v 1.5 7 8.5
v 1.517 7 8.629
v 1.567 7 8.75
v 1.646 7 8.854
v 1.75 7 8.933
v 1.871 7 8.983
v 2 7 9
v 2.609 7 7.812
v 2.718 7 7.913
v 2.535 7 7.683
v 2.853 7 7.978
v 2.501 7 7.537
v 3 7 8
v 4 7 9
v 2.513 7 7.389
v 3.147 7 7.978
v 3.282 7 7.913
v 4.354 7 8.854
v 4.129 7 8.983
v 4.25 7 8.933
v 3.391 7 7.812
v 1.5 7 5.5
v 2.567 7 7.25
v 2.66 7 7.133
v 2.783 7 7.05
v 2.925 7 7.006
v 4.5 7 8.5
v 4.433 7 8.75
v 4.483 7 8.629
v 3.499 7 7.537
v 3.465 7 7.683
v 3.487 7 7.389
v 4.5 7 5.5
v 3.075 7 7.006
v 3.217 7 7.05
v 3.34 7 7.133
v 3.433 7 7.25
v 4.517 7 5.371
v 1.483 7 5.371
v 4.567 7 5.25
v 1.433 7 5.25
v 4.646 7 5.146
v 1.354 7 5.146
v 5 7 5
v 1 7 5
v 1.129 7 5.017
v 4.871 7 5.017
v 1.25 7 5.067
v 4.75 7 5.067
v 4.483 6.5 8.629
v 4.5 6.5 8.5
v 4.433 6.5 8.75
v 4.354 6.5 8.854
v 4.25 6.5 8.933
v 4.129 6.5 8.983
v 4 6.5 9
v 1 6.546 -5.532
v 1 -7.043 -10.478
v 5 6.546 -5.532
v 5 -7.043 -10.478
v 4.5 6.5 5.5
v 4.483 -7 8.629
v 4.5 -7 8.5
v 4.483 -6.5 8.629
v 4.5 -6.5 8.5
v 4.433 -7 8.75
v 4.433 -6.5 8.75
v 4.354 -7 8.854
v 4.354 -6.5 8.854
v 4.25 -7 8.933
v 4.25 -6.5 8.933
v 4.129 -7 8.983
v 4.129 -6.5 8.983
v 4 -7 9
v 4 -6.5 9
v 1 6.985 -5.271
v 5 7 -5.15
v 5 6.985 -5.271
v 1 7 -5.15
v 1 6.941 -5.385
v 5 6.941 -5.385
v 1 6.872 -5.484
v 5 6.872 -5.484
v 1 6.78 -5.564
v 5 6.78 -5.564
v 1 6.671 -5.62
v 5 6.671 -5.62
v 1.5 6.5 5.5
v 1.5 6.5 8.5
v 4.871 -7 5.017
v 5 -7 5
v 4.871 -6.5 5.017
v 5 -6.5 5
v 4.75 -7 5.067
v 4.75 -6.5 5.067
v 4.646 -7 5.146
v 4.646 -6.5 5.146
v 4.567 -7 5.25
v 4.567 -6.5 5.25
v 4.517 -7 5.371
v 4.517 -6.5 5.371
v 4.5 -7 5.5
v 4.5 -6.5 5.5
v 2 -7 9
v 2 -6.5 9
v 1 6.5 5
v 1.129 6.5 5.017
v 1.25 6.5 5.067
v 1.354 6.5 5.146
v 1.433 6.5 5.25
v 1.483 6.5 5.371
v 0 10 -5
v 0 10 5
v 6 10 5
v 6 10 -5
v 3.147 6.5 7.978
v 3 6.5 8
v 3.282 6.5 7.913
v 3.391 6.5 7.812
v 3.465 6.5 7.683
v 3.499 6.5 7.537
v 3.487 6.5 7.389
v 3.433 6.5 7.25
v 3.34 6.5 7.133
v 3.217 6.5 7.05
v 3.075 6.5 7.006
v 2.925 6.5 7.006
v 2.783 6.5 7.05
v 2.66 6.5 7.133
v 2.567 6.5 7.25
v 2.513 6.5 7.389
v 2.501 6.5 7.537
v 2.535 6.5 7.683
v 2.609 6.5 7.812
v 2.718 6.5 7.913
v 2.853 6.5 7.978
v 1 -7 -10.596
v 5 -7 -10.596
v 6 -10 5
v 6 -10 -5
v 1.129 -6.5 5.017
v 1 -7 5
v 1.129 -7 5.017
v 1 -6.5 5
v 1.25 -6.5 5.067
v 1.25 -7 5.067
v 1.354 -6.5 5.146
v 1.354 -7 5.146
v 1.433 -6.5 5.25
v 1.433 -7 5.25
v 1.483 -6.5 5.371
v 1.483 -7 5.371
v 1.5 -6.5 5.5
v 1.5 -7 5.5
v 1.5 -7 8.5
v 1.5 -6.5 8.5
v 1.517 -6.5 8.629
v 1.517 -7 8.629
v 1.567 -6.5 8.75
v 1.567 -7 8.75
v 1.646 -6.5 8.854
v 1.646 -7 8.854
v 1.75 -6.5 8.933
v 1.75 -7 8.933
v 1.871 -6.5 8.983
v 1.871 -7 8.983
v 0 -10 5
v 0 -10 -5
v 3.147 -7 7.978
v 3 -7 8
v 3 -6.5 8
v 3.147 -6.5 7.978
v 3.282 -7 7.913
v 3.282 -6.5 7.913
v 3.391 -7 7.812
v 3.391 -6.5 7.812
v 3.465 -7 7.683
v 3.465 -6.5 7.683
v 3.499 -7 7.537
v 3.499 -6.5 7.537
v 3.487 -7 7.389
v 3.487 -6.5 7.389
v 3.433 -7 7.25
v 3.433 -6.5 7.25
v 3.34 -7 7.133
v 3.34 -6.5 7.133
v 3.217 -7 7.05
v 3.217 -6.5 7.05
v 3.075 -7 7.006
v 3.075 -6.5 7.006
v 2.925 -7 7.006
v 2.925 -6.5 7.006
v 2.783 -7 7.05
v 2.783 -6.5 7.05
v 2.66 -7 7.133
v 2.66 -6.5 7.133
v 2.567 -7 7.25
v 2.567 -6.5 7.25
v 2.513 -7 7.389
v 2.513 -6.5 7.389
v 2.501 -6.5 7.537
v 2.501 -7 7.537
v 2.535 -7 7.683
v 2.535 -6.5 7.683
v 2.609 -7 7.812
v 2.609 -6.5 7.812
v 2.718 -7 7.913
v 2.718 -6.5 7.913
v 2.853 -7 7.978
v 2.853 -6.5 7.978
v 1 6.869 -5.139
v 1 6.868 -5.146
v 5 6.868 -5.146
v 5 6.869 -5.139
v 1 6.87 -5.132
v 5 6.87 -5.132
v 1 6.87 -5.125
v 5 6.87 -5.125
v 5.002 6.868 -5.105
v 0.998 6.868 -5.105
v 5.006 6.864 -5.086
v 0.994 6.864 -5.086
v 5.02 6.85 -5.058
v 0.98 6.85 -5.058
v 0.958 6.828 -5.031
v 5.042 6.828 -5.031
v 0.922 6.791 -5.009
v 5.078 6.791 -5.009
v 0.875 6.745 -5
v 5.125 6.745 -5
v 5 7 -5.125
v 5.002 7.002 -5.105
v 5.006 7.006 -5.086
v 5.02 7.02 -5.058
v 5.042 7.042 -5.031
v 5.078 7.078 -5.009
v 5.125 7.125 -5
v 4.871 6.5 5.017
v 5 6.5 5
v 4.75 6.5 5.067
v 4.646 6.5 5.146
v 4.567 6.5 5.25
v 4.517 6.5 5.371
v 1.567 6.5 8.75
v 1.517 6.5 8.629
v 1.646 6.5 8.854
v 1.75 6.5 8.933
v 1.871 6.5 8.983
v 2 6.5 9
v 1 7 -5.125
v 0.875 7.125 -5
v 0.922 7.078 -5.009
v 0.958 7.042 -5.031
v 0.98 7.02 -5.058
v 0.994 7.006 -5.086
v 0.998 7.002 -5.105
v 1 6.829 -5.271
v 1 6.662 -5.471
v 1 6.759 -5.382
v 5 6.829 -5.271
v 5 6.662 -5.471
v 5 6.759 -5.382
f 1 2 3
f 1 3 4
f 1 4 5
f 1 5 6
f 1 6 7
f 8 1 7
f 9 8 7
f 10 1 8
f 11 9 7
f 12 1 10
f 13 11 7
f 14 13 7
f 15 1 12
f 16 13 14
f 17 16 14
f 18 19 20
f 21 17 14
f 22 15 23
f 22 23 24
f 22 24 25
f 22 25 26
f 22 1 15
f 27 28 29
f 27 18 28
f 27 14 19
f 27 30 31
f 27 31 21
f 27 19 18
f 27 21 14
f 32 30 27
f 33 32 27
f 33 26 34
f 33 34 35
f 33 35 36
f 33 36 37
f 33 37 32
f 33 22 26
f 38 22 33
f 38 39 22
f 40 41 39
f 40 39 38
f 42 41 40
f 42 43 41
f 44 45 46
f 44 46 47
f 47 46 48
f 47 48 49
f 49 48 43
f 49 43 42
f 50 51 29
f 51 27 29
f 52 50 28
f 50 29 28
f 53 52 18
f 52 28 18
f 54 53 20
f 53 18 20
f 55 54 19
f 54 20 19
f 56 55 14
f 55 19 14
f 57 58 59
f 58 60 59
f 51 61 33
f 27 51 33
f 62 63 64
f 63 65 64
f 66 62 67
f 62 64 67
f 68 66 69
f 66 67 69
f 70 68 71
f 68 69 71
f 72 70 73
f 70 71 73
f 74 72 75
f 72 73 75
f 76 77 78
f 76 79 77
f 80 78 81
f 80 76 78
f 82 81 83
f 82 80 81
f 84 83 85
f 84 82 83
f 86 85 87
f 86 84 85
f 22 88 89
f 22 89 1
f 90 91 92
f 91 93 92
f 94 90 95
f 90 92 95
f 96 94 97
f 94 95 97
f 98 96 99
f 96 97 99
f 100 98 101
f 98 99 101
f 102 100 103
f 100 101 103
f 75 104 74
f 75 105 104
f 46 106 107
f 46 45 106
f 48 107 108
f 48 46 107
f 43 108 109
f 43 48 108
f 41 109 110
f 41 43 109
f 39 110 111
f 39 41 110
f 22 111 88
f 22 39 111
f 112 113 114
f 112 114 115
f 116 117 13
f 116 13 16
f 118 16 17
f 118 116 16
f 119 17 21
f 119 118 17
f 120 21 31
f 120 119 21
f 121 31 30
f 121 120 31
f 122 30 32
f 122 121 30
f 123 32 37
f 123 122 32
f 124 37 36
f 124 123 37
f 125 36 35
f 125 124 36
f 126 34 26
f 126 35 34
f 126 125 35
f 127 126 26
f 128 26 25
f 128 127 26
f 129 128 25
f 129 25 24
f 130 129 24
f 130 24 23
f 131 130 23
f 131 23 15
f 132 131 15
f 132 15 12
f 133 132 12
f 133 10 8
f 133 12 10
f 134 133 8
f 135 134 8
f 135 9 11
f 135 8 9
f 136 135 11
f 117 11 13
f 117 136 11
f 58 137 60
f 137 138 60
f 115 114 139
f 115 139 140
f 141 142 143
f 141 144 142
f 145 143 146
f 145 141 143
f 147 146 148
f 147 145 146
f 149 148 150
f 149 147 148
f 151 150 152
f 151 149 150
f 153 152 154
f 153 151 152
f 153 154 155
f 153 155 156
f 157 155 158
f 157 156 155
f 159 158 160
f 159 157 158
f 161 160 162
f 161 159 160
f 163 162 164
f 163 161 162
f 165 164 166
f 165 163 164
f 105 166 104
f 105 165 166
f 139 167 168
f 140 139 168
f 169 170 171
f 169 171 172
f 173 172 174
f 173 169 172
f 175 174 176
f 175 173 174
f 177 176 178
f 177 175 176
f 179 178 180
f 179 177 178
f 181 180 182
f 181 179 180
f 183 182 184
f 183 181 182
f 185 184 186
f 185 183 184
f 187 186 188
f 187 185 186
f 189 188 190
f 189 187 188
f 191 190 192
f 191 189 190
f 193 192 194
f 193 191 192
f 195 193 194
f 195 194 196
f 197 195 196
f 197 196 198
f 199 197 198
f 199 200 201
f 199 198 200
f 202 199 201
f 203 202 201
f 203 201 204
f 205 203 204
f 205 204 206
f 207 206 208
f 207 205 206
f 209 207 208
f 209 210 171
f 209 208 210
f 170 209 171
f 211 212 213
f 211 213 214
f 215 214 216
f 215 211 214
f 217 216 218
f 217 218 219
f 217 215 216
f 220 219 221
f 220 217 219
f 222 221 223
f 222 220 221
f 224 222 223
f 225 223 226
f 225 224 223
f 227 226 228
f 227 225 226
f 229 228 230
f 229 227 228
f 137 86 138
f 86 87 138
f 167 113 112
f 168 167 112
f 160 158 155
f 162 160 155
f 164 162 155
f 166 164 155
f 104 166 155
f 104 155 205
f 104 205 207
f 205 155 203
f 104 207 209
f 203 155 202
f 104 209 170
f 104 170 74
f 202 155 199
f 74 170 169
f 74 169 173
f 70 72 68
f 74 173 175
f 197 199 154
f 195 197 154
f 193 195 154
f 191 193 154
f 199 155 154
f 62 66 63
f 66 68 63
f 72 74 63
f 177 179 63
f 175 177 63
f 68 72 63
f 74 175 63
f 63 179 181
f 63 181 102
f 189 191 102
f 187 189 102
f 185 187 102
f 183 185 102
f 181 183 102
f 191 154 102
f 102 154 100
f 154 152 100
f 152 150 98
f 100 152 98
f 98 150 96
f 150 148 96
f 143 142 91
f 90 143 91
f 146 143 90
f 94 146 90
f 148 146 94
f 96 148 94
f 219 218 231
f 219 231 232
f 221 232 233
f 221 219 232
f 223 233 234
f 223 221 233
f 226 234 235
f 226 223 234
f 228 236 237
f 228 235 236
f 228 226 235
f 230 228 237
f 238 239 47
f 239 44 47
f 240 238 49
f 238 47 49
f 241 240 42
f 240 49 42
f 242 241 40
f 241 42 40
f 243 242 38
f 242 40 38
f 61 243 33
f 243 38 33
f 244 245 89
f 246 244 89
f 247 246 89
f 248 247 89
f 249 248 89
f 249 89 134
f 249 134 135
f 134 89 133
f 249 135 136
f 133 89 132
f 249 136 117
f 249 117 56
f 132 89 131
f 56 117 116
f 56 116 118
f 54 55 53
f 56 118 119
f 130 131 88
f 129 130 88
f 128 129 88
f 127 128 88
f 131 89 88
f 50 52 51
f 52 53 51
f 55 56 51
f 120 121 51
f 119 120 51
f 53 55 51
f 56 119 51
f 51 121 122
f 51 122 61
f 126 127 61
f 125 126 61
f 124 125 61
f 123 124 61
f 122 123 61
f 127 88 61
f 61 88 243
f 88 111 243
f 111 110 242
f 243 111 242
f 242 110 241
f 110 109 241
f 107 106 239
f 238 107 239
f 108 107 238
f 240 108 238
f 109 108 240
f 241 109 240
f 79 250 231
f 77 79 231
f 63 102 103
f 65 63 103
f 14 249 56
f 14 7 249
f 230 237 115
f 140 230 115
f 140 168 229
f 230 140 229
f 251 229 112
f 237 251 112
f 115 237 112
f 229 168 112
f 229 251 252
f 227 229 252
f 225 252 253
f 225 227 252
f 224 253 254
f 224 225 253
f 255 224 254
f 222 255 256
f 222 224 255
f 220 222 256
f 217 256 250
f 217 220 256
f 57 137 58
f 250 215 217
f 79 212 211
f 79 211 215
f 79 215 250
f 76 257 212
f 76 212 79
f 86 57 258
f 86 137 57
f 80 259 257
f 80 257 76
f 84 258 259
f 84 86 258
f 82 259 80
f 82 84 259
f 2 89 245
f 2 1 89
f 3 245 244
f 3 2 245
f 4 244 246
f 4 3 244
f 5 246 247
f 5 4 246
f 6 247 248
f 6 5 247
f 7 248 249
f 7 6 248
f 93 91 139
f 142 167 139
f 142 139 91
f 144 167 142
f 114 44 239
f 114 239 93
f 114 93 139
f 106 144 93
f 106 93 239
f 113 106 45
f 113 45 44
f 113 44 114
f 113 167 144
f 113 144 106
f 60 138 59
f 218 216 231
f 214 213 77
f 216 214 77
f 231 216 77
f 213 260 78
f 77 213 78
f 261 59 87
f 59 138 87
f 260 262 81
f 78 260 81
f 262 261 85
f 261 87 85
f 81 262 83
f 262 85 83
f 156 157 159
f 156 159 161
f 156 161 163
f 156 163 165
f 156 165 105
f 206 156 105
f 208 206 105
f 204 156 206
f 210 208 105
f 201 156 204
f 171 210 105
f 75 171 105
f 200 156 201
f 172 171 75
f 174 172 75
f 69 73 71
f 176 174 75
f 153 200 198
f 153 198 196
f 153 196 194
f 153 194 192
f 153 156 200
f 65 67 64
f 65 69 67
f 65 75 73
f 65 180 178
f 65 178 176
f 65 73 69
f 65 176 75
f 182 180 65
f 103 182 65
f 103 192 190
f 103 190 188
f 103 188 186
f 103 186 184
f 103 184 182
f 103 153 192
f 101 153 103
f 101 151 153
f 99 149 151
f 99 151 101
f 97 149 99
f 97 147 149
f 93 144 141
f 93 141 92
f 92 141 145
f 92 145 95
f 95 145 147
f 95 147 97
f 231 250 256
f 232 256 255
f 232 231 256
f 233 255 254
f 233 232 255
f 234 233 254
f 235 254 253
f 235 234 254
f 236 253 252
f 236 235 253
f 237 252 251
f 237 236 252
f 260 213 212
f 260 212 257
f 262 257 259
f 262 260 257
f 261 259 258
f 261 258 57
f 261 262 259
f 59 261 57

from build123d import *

# Parameters (mm, degrees)
SKETCH1_W               = 10
SKETCH1_H               = 20
BOSS_EXTRUDE1_DEPTH     = 6
SKETCH2_W               = 3
SKETCH2_H               = 0.5
BOSS_EXTRUDE2_DEPTH     = 4
FILLET1_R               = 0.5
CUT_EXTRUDE1_DEPTH      = 21.14944168
CUT_EXTRUDE1_DEPTH_BACK = 21.14944168
SKETCH3_R               = 0.5
BOSS_EXTRUDE3_DEPTH     = 2
FILLET2_R               = 0.5
FILLET3_R               = 0.125


with BuildPart() as part:
    # Sketch1 → Boss-Extrude1 (new body)
    with BuildSketch(Plane(origin=(0, 0, 0), x_dir=(0, 0, -1), z_dir=(1, 0, 0))):
        Rectangle(SKETCH1_W, SKETCH1_H)
    extrude(amount=BOSS_EXTRUDE1_DEPTH)

    # Sketch2 → Boss-Extrude2 (add)
    with BuildSketch(Plane.XY.offset(5)):
        with Locations((3, 6.75)):
            Rectangle(SKETCH2_W, SKETCH2_H)
        with Locations((3, -6.75)):
            Rectangle(SKETCH2_W, SKETCH2_H)
    extrude(amount=BOSS_EXTRUDE2_DEPTH)

    # Fillet1
    fillet1_edges = [part.edges().sort_by_distance(p)[0] for p in [
        (1.5, 6.75, 5),
        (4.5, 6.75, 5),
        (1.5, 6.75, 9),
        (4.5, 6.75, 9),
        (1.5, -6.75, 5),
        (4.5, -6.75, 5),
        (1.5, -6.75, 9),
        (4.5, -6.75, 9),
    ]]
    fillet(fillet1_edges, radius=FILLET1_R)

    # Sketch3 → Cut-Extrude1 (cut, two sides: drawn at the far end of the back side and taken through both)
    with BuildSketch(Plane(origin=(0, 7, 0), x_dir=(1, 0, 0), z_dir=(0, 1, 0)).offset(-CUT_EXTRUDE1_DEPTH_BACK)):
        with Locations(Location((3, -7.5, 0), (0, 0, 270))):
            Circle(SKETCH3_R)
    extrude(amount=CUT_EXTRUDE1_DEPTH + CUT_EXTRUDE1_DEPTH_BACK, mode=Mode.SUBTRACT)

    # Sketch4 → Boss-Extrude3 (add, symmetric)
    with BuildSketch(Plane(origin=(3, 0, 0), x_dir=(0, 0, -1), z_dir=(1, 0, 0))):
        Polygon((5, 7), (5.5, 7), (10.59558328, -7), (10.478121702, -7.042752518), (5.412474058, 6.875), (5, 6.875), (4.5, 6.875), (4.5, 7), align=None)
    extrude(amount=BOSS_EXTRUDE3_DEPTH, both=True)

    # Fillet2
    fillet2_edges = [part.edges().sort_by_distance(p)[0] for p in [
        (3, 7, -5.5),
        (3, 6.875, -5.412474058),
    ]]
    fillet(fillet2_edges, radius=FILLET2_R)

    # Fillet3
    # the kernel refuses this fillet: 0.125 mm, written as the material it adds along each edge
    with BuildSketch(Plane(origin=(1, 6.875, -5), x_dir=(-1, 0, 0), z_dir=(0, 1, 0)), Plane(origin=(5, 6.875, -5), x_dir=(0, 0, -1), z_dir=(0, 1, 0))) as fillet3_piece_1:
        with BuildLine():
            CenterArc((FILLET3_R, -FILLET3_R), FILLET3_R, 90, 90)
            Line((0, -FILLET3_R), (-FILLET3_R * 0.02, -FILLET3_R))
            Line((-FILLET3_R * 0.02, -FILLET3_R), (-FILLET3_R * 0.02, FILLET3_R * 0.02))
            Line((-FILLET3_R * 0.02, FILLET3_R * 0.02), (FILLET3_R, FILLET3_R * 0.02))
            Line((FILLET3_R, FILLET3_R * 0.02), (FILLET3_R, 0))
        make_face()
    extrude(amount=0.125)
    with BuildSketch(Plane(origin=(1, 6.875, -5), x_dir=(0, -1, 0), z_dir=(1, 0, 0))) as fillet3_piece_2:
        with BuildLine():
            CenterArc((0.130266962, 0.125), FILLET3_R, 170.385831611, 99.614168389)
            Line((0.007022616, 0.14587657), (-0.005301818, 0.147964228))
            ThreePointArc((-0.005301818, 0.147964228), (-0.0125, 0.062370289), (-0.0125, 0))
            Line((-0.0125, 0), (0, -0.0125))
            Line((0, -0.0125), (0.130266962, -0.0125))
            Line((0.130266962, -0.0125), (0.130266962, 0))
        make_face()
    extrude(amount=4)
    with BuildSketch(Plane(origin=(5, 7, -5), x_dir=(0, 0, -1), z_dir=(-1, 0, 0))) as fillet3_piece_3:
        with BuildLine():
            CenterArc((FILLET3_R, -FILLET3_R), FILLET3_R, 90, 90)
            Line((0, -FILLET3_R), (-FILLET3_R * 0.02, -FILLET3_R))
            Line((-FILLET3_R * 0.02, -FILLET3_R), (-FILLET3_R * 0.02, FILLET3_R * 0.02))
            Line((-FILLET3_R * 0.02, FILLET3_R * 0.02), (FILLET3_R, FILLET3_R * 0.02))
            Line((FILLET3_R, FILLET3_R * 0.02), (FILLET3_R, 0))
        make_face()
    extrude(amount=4)
    with BuildSketch(Plane(origin=(0.634886225, 6.875, -5), x_dir=(0, -1, 0), z_dir=(1, 0, 0))) as fillet3_piece_4a_section:
        with BuildLine():
            CenterArc((0.130266962, 0.125), FILLET3_R, 170.385831611, 99.614168389)
            Line((0.007022616, 0.14587657), (-0.005301818, 0.147964228))
            ThreePointArc((-0.005301818, 0.147964228), (-0.0125, 0.062370289), (-0.0125, 0))
            Line((-0.0125, 0), (0, -0.0125))
            Line((0, -0.0125), (0.130266962, -0.0125))
            Line((0.130266962, -0.0125), (0.130266962, 0))
        make_face()
    fillet3_piece_4a = extrude(amount=4.365113775, mode=Mode.PRIVATE)
    fillet3_piece_4a = split(fillet3_piece_4a, bisect_by=Plane(origin=(1, 6.846895643, -5.033240906), z_dir=(-1, 0, 0)), keep=Keep.TOP, mode=Mode.PRIVATE)
    with BuildSketch(Plane(origin=(1, 6.5625, -5), x_dir=(-1, 0, 0), z_dir=(0, 1, 0))) as fillet3_piece_4b_section:
        with BuildLine():
            CenterArc((FILLET3_R, -FILLET3_R), FILLET3_R, 90, 90)
            Line((0, -FILLET3_R), (-FILLET3_R * 0.02, -FILLET3_R))
            Line((-FILLET3_R * 0.02, -FILLET3_R), (-FILLET3_R * 0.02, FILLET3_R * 0.02))
            Line((-FILLET3_R * 0.02, FILLET3_R * 0.02), (FILLET3_R, FILLET3_R * 0.02))
            Line((FILLET3_R, FILLET3_R * 0.02), (FILLET3_R, 0))
        make_face()
    fillet3_piece_4b = extrude(amount=0.4375, mode=Mode.PRIVATE)
    fillet3_piece_4b = split(fillet3_piece_4b, bisect_by=Plane(origin=(0.971700611, 6.875, -5.028299389), z_dir=(0, -1, 0)), keep=Keep.TOP, mode=Mode.PRIVATE)
    fillet3_piece_4 = fillet3_piece_4a & fillet3_piece_4b
    add(fillet3_piece_4)
    with BuildSketch(Plane(origin=(5, 7, -5), x_dir=(0, 0, -1), z_dir=(-1, 0, 0))) as fillet3_piece_5a_section:
        with BuildLine():
            CenterArc((FILLET3_R, -FILLET3_R), FILLET3_R, 90, 90)
            Line((0, -FILLET3_R), (-FILLET3_R * 0.02, -FILLET3_R))
            Line((-FILLET3_R * 0.02, -FILLET3_R), (-FILLET3_R * 0.02, FILLET3_R * 0.02))
            Line((-FILLET3_R * 0.02, FILLET3_R * 0.02), (FILLET3_R, FILLET3_R * 0.02))
            Line((FILLET3_R, FILLET3_R * 0.02), (FILLET3_R, 0))
        make_face()
    fillet3_piece_5a = extrude(amount=4.3125, mode=Mode.PRIVATE)
    fillet3_piece_5a = split(fillet3_piece_5a, bisect_by=Plane(origin=(1, 7.028299389, -5.028299389), z_dir=(-1, 0, 0)), keep=Keep.TOP, mode=Mode.PRIVATE)
    with BuildSketch(Plane(origin=(1, 6.875, -5), x_dir=(-1, 0, 0), z_dir=(0, 1, 0))) as fillet3_piece_5b_section:
        with BuildLine():
            CenterArc((FILLET3_R, -FILLET3_R), FILLET3_R, 90, 90)
            Line((0, -FILLET3_R), (-FILLET3_R * 0.02, -FILLET3_R))
            Line((-FILLET3_R * 0.02, -FILLET3_R), (-FILLET3_R * 0.02, FILLET3_R * 0.02))
            Line((-FILLET3_R * 0.02, FILLET3_R * 0.02), (FILLET3_R, FILLET3_R * 0.02))
            Line((FILLET3_R, FILLET3_R * 0.02), (FILLET3_R, 0))
        make_face()
    fillet3_piece_5b = extrude(amount=0.4375, mode=Mode.PRIVATE)
    fillet3_piece_5b = split(fillet3_piece_5b, bisect_by=Plane(origin=(0.971700611, 7, -5.028299389), z_dir=(0, 1, 0)), keep=Keep.TOP, mode=Mode.PRIVATE)
    fillet3_piece_5 = fillet3_piece_5a & fillet3_piece_5b
    add(fillet3_piece_5)
    with BuildSketch(Plane(origin=(5, 6.5625, -5), x_dir=(0, 0, -1), z_dir=(0, 1, 0))) as fillet3_piece_6a_section:
        with BuildLine():
            CenterArc((FILLET3_R, -FILLET3_R), FILLET3_R, 90, 90)
            Line((0, -FILLET3_R), (-FILLET3_R * 0.02, -FILLET3_R))
            Line((-FILLET3_R * 0.02, -FILLET3_R), (-FILLET3_R * 0.02, FILLET3_R * 0.02))
            Line((-FILLET3_R * 0.02, FILLET3_R * 0.02), (FILLET3_R, FILLET3_R * 0.02))
            Line((FILLET3_R, FILLET3_R * 0.02), (FILLET3_R, 0))
        make_face()
    fillet3_piece_6a = extrude(amount=0.4375, mode=Mode.PRIVATE)
    fillet3_piece_6a = split(fillet3_piece_6a, bisect_by=Plane(origin=(5.028299389, 6.875, -5.028299389), z_dir=(0, -1, 0)), keep=Keep.TOP, mode=Mode.PRIVATE)
    with BuildSketch(Plane(origin=(1, 6.875, -5), x_dir=(0, -1, 0), z_dir=(1, 0, 0))) as fillet3_piece_6b_section:
        with BuildLine():
            CenterArc((0.130266962, 0.125), FILLET3_R, 170.385831611, 99.614168389)
            Line((0.007022616, 0.14587657), (-0.005301818, 0.147964228))
            ThreePointArc((-0.005301818, 0.147964228), (-0.0125, 0.062370289), (-0.0125, 0))
            Line((-0.0125, 0), (0, -0.0125))
            Line((0, -0.0125), (0.130266962, -0.0125))
            Line((0.130266962, -0.0125), (0.130266962, 0))
        make_face()
    fillet3_piece_6b = extrude(amount=4.365113775, mode=Mode.PRIVATE)
    fillet3_piece_6b = split(fillet3_piece_6b, bisect_by=Plane(origin=(5, 6.846895643, -5.033240906), z_dir=(1, 0, 0)), keep=Keep.TOP, mode=Mode.PRIVATE)
    fillet3_piece_6 = fillet3_piece_6a & fillet3_piece_6b
    add(fillet3_piece_6)
    with BuildSketch(Plane(origin=(5, 6.875, -5), x_dir=(0, 0, -1), z_dir=(0, 1, 0))) as fillet3_piece_7a_section:
        with BuildLine():
            CenterArc((FILLET3_R, -FILLET3_R), FILLET3_R, 90, 90)
            Line((0, -FILLET3_R), (-FILLET3_R * 0.02, -FILLET3_R))
            Line((-FILLET3_R * 0.02, -FILLET3_R), (-FILLET3_R * 0.02, FILLET3_R * 0.02))
            Line((-FILLET3_R * 0.02, FILLET3_R * 0.02), (FILLET3_R, FILLET3_R * 0.02))
            Line((FILLET3_R, FILLET3_R * 0.02), (FILLET3_R, 0))
        make_face()
    fillet3_piece_7a = extrude(amount=0.4375, mode=Mode.PRIVATE)
    fillet3_piece_7a = split(fillet3_piece_7a, bisect_by=Plane(origin=(5.028299389, 7, -5.028299389), z_dir=(0, 1, 0)), keep=Keep.TOP, mode=Mode.PRIVATE)
    with BuildSketch(Plane(origin=(5.3125, 7, -5), x_dir=(0, 0, -1), z_dir=(-1, 0, 0))) as fillet3_piece_7b_section:
        with BuildLine():
            CenterArc((FILLET3_R, -FILLET3_R), FILLET3_R, 90, 90)
            Line((0, -FILLET3_R), (-FILLET3_R * 0.02, -FILLET3_R))
            Line((-FILLET3_R * 0.02, -FILLET3_R), (-FILLET3_R * 0.02, FILLET3_R * 0.02))
            Line((-FILLET3_R * 0.02, FILLET3_R * 0.02), (FILLET3_R, FILLET3_R * 0.02))
            Line((FILLET3_R, FILLET3_R * 0.02), (FILLET3_R, 0))
        make_face()
    fillet3_piece_7b = extrude(amount=4.3125, mode=Mode.PRIVATE)
    fillet3_piece_7b = split(fillet3_piece_7b, bisect_by=Plane(origin=(5, 7.028299389, -5.028299389), z_dir=(1, 0, 0)), keep=Keep.TOP, mode=Mode.PRIVATE)
    fillet3_piece_7 = fillet3_piece_7a & fillet3_piece_7b
    add(fillet3_piece_7)


solid = part.part
